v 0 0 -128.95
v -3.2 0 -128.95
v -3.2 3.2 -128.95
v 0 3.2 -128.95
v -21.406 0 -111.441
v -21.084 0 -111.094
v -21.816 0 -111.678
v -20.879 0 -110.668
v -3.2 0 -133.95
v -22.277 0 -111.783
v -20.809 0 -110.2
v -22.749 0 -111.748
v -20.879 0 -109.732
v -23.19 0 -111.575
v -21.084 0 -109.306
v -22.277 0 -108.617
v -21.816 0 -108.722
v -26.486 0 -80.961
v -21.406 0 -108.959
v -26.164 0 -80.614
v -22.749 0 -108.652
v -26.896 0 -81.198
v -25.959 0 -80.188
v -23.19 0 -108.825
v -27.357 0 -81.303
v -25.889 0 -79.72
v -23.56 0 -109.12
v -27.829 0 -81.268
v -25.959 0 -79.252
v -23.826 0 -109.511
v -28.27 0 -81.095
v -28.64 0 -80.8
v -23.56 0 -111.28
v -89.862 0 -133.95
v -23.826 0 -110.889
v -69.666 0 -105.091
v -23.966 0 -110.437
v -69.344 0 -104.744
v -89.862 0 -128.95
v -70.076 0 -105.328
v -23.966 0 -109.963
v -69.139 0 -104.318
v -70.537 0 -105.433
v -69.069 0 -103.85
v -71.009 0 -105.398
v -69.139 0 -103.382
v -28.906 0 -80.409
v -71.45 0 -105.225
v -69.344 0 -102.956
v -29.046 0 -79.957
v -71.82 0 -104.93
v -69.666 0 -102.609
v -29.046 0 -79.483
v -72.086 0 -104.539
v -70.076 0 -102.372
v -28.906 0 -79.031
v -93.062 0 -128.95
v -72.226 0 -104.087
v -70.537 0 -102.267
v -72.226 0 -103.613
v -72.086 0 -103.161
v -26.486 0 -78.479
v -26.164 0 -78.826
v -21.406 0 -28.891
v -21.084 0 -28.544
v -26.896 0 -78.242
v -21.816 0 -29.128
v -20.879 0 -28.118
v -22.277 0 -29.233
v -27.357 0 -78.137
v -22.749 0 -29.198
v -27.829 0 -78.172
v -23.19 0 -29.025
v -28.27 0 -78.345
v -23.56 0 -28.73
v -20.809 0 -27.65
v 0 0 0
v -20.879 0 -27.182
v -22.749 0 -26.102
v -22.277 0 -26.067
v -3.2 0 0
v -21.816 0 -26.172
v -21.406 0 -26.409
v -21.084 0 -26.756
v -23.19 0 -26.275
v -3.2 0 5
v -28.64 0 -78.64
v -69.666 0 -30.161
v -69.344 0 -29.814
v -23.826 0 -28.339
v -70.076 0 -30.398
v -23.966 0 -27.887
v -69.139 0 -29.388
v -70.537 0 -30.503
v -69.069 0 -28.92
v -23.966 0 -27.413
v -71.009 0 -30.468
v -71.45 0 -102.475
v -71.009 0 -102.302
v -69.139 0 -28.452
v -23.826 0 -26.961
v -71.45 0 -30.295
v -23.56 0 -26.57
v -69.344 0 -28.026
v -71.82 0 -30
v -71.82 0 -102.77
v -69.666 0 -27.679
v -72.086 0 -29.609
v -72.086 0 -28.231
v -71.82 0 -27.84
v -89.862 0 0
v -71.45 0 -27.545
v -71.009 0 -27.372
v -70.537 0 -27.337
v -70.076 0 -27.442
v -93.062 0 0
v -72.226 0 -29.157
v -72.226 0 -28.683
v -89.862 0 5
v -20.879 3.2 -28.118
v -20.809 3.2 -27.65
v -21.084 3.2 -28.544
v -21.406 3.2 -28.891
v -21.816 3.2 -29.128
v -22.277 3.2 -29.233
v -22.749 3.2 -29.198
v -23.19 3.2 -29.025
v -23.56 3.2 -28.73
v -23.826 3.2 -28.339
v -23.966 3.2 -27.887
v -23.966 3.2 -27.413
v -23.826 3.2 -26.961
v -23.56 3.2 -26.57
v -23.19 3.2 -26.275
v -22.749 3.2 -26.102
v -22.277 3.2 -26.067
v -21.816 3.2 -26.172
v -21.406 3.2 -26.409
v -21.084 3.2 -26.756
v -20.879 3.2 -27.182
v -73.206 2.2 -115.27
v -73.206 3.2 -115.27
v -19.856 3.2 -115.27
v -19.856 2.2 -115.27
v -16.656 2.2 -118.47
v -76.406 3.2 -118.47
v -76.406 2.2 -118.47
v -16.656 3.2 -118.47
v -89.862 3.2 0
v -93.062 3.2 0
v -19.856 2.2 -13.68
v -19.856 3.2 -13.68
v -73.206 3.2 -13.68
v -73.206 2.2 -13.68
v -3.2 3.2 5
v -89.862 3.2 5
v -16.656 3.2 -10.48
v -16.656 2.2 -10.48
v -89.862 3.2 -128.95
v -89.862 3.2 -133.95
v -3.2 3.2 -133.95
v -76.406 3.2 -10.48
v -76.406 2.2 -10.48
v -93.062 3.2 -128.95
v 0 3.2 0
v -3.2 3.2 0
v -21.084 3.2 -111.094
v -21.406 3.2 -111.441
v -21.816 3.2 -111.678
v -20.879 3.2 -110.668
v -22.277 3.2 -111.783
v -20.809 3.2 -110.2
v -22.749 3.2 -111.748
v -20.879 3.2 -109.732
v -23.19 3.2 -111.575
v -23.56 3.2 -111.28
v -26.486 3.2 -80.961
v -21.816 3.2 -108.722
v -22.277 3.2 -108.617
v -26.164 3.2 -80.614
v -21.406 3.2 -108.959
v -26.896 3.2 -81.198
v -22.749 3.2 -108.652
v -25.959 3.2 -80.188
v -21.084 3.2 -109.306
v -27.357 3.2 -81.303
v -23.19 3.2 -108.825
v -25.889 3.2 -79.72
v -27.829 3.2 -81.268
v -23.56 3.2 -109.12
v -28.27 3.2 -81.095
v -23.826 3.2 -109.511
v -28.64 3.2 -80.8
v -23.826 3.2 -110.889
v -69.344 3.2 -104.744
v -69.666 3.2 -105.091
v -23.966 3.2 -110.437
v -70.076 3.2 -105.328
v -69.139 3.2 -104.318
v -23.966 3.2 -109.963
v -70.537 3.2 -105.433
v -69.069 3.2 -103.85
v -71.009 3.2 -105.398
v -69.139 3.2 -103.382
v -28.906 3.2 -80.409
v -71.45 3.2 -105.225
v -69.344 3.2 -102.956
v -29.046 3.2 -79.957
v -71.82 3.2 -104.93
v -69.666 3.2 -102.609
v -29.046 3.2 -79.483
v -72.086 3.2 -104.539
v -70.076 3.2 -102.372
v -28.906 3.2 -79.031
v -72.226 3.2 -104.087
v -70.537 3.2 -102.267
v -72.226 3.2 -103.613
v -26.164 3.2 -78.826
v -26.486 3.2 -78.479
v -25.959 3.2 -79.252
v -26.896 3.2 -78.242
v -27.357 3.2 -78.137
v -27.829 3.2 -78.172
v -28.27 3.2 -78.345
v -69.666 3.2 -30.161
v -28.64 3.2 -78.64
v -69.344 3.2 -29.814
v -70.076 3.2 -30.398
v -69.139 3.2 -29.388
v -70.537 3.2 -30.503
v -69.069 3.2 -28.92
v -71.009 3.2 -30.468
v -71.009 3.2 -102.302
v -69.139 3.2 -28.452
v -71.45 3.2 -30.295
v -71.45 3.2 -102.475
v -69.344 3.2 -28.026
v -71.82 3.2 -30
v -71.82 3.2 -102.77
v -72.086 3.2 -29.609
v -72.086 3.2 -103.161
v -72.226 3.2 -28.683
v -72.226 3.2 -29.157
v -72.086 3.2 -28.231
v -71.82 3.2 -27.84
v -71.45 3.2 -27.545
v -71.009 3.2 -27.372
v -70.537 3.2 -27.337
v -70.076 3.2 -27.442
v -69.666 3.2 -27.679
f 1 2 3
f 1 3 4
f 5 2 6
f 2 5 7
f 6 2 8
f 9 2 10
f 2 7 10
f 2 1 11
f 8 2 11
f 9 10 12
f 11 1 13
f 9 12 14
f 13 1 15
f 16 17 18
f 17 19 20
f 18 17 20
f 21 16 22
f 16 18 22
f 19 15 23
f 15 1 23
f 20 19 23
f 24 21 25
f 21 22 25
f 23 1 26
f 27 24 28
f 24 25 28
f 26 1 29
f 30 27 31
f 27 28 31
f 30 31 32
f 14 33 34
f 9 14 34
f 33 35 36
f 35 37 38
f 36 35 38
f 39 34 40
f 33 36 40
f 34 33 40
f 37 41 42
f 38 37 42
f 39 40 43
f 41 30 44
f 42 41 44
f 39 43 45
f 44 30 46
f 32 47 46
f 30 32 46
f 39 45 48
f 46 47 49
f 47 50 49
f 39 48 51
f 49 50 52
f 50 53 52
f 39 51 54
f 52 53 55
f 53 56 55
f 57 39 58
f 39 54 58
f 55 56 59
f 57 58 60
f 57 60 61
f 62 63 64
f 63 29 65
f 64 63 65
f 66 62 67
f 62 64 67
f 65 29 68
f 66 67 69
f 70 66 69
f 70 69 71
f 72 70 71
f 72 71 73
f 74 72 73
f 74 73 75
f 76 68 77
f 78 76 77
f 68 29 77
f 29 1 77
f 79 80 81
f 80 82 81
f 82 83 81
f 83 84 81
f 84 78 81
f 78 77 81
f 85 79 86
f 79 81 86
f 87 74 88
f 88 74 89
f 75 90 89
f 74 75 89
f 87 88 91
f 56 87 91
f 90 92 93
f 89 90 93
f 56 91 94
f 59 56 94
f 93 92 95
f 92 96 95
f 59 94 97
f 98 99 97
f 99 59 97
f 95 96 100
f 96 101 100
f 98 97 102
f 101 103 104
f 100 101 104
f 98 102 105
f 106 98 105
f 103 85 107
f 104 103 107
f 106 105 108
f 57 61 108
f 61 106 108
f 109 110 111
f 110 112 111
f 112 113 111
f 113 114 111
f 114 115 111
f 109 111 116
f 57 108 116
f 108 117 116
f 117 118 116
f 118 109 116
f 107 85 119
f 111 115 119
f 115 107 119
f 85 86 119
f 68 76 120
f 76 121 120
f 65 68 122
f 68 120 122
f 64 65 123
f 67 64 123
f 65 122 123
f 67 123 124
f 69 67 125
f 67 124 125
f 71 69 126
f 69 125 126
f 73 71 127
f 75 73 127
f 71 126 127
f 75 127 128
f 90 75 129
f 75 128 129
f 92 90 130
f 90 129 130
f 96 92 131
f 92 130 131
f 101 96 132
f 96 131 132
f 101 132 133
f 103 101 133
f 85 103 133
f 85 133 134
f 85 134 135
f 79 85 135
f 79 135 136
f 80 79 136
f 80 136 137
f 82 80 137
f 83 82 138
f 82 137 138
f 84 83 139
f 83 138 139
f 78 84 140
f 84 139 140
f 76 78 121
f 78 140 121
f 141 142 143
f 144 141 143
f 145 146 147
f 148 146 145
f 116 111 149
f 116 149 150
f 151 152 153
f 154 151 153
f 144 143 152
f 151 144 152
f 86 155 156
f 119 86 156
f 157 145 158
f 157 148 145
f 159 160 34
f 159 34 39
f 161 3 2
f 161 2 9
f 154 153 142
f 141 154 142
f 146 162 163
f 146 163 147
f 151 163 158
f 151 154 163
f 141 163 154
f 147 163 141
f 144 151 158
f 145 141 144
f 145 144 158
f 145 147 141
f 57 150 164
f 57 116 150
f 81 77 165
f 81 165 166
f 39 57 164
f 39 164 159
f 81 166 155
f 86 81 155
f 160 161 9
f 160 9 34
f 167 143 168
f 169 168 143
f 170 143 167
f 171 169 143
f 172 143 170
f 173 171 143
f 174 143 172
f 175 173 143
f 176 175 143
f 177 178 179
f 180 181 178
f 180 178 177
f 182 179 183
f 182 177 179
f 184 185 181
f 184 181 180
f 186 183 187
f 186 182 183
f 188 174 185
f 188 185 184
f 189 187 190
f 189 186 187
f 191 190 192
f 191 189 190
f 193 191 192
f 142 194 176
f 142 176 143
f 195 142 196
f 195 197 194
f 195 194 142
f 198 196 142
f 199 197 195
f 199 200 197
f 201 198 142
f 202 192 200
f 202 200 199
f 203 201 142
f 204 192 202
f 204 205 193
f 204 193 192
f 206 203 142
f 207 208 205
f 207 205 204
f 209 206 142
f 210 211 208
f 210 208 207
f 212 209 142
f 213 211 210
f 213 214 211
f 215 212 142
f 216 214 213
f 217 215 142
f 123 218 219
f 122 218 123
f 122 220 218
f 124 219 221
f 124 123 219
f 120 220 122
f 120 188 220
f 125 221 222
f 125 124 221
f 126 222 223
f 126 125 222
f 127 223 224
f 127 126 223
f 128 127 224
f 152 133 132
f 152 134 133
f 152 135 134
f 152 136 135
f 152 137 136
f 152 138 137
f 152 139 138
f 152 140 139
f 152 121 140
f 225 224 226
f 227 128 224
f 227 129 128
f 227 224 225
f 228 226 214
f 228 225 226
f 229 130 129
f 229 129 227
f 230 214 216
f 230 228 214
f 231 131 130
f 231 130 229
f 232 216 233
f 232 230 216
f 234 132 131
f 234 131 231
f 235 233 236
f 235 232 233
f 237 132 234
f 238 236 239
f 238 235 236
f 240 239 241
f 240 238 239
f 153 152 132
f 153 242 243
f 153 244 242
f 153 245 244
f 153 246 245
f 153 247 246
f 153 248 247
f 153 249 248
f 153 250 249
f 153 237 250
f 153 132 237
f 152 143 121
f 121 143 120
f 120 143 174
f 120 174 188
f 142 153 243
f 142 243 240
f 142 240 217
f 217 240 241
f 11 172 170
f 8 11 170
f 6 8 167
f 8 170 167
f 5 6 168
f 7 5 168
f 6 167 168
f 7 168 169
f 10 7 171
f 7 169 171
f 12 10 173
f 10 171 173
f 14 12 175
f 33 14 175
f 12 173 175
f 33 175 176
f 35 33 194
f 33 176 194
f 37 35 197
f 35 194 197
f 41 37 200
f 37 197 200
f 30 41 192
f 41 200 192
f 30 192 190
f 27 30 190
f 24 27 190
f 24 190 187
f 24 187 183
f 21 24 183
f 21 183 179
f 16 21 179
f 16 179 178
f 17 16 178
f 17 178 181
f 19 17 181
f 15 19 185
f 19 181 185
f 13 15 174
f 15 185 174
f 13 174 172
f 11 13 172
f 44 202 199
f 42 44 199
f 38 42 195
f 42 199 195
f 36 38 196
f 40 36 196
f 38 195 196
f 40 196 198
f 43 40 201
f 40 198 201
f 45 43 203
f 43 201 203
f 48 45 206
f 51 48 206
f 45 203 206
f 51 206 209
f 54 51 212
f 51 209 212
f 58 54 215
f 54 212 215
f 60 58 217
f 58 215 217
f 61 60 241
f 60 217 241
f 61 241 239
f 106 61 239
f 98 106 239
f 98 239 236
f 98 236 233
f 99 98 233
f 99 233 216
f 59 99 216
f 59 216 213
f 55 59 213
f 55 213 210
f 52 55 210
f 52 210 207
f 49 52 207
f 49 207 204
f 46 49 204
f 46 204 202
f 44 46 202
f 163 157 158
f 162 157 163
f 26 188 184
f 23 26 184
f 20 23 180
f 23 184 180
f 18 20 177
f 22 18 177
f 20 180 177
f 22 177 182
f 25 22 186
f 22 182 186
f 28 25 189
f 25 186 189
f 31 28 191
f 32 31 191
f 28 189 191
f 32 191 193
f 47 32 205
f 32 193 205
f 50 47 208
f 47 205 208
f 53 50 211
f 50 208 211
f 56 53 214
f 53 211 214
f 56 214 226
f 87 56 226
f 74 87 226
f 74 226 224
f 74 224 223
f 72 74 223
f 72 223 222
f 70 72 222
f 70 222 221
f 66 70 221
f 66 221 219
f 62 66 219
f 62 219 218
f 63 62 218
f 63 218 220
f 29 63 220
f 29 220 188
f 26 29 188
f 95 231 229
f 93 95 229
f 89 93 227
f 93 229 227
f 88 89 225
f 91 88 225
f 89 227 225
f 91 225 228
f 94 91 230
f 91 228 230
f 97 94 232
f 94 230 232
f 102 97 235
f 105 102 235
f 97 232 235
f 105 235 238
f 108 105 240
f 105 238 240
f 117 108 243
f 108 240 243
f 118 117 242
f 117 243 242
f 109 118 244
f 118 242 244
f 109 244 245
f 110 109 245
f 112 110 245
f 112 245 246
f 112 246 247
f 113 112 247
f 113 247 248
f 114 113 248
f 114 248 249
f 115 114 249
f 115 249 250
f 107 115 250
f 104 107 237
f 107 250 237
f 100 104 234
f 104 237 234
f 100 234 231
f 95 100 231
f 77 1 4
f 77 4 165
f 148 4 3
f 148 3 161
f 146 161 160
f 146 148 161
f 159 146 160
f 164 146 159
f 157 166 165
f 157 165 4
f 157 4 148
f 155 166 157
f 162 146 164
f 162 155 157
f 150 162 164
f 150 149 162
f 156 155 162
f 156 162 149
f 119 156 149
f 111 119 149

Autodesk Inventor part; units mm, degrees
ref_plane "YZ Plane" through (0, 0, 0) normal (1, 0, 0) x (0, 1, 0)
ref_plane "XZ Plane" through (0, 0, 0) normal (0, 1, 0) x (-1, 0, 0)
ref_plane "XY Plane" through (0, 0, 0) normal (0, 0, 1) x (1, 0, 0)
sketch "Sketch1" plane through (0, 0, 0) normal (0, 1, 0) x (-1, 0, 0)
  line L0 (0, 0) -> (93.0623, 0)
  line L1 (93.0623, 0) -> (93.0623, -128.95)
  line L2 (93.0623, -128.95) -> (0, -128.95)
  line L3 (0, -128.95) -> (0, 0)
  dimension "d0" = 93.0623
  dimension "d1" = 128.95
extrude "Extrusion1" add sketch "Sketch1" along normal blind 3.2
sketch "Sketch2" plane through (0, 3.2, 0) normal (0, 1, 0) x (1, 0, 0)
  line L0 (-73.2061, 115.27) -> (-19.8561, 115.27)
  line L1 (-19.8561, 115.27) -> (-19.8561, 13.68)
  line L2 (-19.8561, 13.68) -> (-73.2061, 13.68)
  line L3 (-73.2061, 13.68) -> (-73.2061, 115.27)
  circle A0 centre (-70.6561, 28.92) radius 1.5875
  circle A1 centre (-22.3961, 27.65) radius 1.5875
  circle A2 centre (-22.3961, 110.2) radius 1.5875
  circle A3 centre (-70.6561, 103.85) radius 1.5875
  circle A4 centre (-27.4761, 79.72) radius 1.5875
  line L4 (-93.0623, 0) -> (0, 0) projected
  line L5 (-93.0623, 128.95) -> (-93.0623, 0) projected
  line L6 (0, 128.95) -> (-93.0623, 128.95) projected
  line L7 (-76.4061, 118.47) -> (-16.6561, 118.47)
  line L8 (-16.6561, 118.47) -> (-16.6561, 10.48)
  line L9 (-16.6561, 10.48) -> (-76.4061, 10.48)
  line L10 (-76.4061, 10.48) -> (-76.4061, 118.47)
  dimension "d4" = 101.59
  dimension "d5" = 53.35
  dimension "d6" = 15.24
  dimension "d7" = 3.175
  dimension "d8" = 50.8
  dimension "d9" = 13.97
  dimension "d10" = 2.54
  dimension "d11" = 90.17
  dimension "d12" = 96.52
  dimension "d13" = 50.8
  dimension "d14" = 2.54
  dimension "d15" = 66.04
  dimension "d16" = 7.62
  dimension "d20" = 93.0623
  dimension "d21" = 19.8561
  dimension "d22" = 128.95
  dimension "d23" = 13.68
  dimension "d26" = 3.2
  dimension "d27" = 3.2
  dimension "d28" = 3.2
  dimension "d29" = 3.2
extrude "Extrusion2" cut sketch "Sketch2" against normal up to surface (3.2 mm away) contours A0 | A1 | A2 | A3 | A4
sketch "Sketch3" plane through (0, 3.2, 0) normal (0, 1, 0) x (1, 0, 0)
  line L0 (-76.4061, 10.48) -> (-76.4061, 118.47) projected
  line L1 (-73.2061, 13.68) -> (-73.2061, 115.27) projected
  line L2 (-19.8561, 13.68) -> (-73.2061, 13.68) projected
  line L3 (-16.6561, 10.48) -> (-76.4061, 10.48) projected
  line L4 (-16.6561, 118.47) -> (-16.6561, 10.48) projected
  line L5 (-73.2061, 115.27) -> (-19.8561, 115.27) projected
  line L6 (-76.4061, 118.47) -> (-16.6561, 118.47) projected
  line L7 (-19.8561, 115.27) -> (-19.8561, 13.68) projected
  point P0 (0, 0)
extrude "Extrusion3" cut sketch "Sketch3" against normal blind 1
sketch "Sketch4" plane through (0, 3.2, 0) normal (0, 1, 0) x (1, 0, 0)
  line L0 (-93.0623, 0) -> (0, 0) projected
  line L1 (-89.8623, 0) -> (-3.2, 0)
  line L2 (-3.2, 0) -> (-3.2, -5)
  line L3 (-3.2, -5) -> (-89.8623, -5)
  line L4 (-89.8623, -5) -> (-89.8623, 0)
  line L5 (0, 128.95) -> (-93.0623, 128.95) projected
  line L6 (-89.8623, 128.95) -> (-3.2, 128.95)
  line L7 (-3.2, 128.95) -> (-3.2, 133.95)
  line L8 (-3.2, 133.95) -> (-89.8623, 133.95)
  line L9 (-89.8623, 133.95) -> (-89.8623, 128.95)
  line L10 (-93.0623, 128.95) -> (-93.0623, 0) projected
  line L11 (0, 0) -> (0, 128.95) projected
  dimension "d32" = 3.2
  dimension "d33" = 3.2
  dimension "d34" = 5
  dimension "d35" = 5
extrude "Extrusion4" add sketch "Sketch4" against normal up to surface (3.2 mm away) contours L0 L2 L3 L4 | L9 L8 L7 L5
equation "\"d1\" = largo_abdomen_robot - acople_hombro_grosor_trasero"
equation "\"d13\" = d8"
equation "\"d14\" = d10"
equation "\"d21\" = -0.5 * d5 + 0.5 * d20"
equation "\"d23\" = -0.5 * d4 + 0.5 * d22"
equation "\"d27\" = d26"
equation "\"d28\" = d26"
equation "\"d29\" = d28"
equation "\"d33\" = d32"
equation "\"d35\" = d34"
equation "\"largo_abdomen_robot\" = 146.95"
equation "\"acople_hombro_grosor_trasero\" = 18"
properties part number "Cuerpo - Base Arduino"
